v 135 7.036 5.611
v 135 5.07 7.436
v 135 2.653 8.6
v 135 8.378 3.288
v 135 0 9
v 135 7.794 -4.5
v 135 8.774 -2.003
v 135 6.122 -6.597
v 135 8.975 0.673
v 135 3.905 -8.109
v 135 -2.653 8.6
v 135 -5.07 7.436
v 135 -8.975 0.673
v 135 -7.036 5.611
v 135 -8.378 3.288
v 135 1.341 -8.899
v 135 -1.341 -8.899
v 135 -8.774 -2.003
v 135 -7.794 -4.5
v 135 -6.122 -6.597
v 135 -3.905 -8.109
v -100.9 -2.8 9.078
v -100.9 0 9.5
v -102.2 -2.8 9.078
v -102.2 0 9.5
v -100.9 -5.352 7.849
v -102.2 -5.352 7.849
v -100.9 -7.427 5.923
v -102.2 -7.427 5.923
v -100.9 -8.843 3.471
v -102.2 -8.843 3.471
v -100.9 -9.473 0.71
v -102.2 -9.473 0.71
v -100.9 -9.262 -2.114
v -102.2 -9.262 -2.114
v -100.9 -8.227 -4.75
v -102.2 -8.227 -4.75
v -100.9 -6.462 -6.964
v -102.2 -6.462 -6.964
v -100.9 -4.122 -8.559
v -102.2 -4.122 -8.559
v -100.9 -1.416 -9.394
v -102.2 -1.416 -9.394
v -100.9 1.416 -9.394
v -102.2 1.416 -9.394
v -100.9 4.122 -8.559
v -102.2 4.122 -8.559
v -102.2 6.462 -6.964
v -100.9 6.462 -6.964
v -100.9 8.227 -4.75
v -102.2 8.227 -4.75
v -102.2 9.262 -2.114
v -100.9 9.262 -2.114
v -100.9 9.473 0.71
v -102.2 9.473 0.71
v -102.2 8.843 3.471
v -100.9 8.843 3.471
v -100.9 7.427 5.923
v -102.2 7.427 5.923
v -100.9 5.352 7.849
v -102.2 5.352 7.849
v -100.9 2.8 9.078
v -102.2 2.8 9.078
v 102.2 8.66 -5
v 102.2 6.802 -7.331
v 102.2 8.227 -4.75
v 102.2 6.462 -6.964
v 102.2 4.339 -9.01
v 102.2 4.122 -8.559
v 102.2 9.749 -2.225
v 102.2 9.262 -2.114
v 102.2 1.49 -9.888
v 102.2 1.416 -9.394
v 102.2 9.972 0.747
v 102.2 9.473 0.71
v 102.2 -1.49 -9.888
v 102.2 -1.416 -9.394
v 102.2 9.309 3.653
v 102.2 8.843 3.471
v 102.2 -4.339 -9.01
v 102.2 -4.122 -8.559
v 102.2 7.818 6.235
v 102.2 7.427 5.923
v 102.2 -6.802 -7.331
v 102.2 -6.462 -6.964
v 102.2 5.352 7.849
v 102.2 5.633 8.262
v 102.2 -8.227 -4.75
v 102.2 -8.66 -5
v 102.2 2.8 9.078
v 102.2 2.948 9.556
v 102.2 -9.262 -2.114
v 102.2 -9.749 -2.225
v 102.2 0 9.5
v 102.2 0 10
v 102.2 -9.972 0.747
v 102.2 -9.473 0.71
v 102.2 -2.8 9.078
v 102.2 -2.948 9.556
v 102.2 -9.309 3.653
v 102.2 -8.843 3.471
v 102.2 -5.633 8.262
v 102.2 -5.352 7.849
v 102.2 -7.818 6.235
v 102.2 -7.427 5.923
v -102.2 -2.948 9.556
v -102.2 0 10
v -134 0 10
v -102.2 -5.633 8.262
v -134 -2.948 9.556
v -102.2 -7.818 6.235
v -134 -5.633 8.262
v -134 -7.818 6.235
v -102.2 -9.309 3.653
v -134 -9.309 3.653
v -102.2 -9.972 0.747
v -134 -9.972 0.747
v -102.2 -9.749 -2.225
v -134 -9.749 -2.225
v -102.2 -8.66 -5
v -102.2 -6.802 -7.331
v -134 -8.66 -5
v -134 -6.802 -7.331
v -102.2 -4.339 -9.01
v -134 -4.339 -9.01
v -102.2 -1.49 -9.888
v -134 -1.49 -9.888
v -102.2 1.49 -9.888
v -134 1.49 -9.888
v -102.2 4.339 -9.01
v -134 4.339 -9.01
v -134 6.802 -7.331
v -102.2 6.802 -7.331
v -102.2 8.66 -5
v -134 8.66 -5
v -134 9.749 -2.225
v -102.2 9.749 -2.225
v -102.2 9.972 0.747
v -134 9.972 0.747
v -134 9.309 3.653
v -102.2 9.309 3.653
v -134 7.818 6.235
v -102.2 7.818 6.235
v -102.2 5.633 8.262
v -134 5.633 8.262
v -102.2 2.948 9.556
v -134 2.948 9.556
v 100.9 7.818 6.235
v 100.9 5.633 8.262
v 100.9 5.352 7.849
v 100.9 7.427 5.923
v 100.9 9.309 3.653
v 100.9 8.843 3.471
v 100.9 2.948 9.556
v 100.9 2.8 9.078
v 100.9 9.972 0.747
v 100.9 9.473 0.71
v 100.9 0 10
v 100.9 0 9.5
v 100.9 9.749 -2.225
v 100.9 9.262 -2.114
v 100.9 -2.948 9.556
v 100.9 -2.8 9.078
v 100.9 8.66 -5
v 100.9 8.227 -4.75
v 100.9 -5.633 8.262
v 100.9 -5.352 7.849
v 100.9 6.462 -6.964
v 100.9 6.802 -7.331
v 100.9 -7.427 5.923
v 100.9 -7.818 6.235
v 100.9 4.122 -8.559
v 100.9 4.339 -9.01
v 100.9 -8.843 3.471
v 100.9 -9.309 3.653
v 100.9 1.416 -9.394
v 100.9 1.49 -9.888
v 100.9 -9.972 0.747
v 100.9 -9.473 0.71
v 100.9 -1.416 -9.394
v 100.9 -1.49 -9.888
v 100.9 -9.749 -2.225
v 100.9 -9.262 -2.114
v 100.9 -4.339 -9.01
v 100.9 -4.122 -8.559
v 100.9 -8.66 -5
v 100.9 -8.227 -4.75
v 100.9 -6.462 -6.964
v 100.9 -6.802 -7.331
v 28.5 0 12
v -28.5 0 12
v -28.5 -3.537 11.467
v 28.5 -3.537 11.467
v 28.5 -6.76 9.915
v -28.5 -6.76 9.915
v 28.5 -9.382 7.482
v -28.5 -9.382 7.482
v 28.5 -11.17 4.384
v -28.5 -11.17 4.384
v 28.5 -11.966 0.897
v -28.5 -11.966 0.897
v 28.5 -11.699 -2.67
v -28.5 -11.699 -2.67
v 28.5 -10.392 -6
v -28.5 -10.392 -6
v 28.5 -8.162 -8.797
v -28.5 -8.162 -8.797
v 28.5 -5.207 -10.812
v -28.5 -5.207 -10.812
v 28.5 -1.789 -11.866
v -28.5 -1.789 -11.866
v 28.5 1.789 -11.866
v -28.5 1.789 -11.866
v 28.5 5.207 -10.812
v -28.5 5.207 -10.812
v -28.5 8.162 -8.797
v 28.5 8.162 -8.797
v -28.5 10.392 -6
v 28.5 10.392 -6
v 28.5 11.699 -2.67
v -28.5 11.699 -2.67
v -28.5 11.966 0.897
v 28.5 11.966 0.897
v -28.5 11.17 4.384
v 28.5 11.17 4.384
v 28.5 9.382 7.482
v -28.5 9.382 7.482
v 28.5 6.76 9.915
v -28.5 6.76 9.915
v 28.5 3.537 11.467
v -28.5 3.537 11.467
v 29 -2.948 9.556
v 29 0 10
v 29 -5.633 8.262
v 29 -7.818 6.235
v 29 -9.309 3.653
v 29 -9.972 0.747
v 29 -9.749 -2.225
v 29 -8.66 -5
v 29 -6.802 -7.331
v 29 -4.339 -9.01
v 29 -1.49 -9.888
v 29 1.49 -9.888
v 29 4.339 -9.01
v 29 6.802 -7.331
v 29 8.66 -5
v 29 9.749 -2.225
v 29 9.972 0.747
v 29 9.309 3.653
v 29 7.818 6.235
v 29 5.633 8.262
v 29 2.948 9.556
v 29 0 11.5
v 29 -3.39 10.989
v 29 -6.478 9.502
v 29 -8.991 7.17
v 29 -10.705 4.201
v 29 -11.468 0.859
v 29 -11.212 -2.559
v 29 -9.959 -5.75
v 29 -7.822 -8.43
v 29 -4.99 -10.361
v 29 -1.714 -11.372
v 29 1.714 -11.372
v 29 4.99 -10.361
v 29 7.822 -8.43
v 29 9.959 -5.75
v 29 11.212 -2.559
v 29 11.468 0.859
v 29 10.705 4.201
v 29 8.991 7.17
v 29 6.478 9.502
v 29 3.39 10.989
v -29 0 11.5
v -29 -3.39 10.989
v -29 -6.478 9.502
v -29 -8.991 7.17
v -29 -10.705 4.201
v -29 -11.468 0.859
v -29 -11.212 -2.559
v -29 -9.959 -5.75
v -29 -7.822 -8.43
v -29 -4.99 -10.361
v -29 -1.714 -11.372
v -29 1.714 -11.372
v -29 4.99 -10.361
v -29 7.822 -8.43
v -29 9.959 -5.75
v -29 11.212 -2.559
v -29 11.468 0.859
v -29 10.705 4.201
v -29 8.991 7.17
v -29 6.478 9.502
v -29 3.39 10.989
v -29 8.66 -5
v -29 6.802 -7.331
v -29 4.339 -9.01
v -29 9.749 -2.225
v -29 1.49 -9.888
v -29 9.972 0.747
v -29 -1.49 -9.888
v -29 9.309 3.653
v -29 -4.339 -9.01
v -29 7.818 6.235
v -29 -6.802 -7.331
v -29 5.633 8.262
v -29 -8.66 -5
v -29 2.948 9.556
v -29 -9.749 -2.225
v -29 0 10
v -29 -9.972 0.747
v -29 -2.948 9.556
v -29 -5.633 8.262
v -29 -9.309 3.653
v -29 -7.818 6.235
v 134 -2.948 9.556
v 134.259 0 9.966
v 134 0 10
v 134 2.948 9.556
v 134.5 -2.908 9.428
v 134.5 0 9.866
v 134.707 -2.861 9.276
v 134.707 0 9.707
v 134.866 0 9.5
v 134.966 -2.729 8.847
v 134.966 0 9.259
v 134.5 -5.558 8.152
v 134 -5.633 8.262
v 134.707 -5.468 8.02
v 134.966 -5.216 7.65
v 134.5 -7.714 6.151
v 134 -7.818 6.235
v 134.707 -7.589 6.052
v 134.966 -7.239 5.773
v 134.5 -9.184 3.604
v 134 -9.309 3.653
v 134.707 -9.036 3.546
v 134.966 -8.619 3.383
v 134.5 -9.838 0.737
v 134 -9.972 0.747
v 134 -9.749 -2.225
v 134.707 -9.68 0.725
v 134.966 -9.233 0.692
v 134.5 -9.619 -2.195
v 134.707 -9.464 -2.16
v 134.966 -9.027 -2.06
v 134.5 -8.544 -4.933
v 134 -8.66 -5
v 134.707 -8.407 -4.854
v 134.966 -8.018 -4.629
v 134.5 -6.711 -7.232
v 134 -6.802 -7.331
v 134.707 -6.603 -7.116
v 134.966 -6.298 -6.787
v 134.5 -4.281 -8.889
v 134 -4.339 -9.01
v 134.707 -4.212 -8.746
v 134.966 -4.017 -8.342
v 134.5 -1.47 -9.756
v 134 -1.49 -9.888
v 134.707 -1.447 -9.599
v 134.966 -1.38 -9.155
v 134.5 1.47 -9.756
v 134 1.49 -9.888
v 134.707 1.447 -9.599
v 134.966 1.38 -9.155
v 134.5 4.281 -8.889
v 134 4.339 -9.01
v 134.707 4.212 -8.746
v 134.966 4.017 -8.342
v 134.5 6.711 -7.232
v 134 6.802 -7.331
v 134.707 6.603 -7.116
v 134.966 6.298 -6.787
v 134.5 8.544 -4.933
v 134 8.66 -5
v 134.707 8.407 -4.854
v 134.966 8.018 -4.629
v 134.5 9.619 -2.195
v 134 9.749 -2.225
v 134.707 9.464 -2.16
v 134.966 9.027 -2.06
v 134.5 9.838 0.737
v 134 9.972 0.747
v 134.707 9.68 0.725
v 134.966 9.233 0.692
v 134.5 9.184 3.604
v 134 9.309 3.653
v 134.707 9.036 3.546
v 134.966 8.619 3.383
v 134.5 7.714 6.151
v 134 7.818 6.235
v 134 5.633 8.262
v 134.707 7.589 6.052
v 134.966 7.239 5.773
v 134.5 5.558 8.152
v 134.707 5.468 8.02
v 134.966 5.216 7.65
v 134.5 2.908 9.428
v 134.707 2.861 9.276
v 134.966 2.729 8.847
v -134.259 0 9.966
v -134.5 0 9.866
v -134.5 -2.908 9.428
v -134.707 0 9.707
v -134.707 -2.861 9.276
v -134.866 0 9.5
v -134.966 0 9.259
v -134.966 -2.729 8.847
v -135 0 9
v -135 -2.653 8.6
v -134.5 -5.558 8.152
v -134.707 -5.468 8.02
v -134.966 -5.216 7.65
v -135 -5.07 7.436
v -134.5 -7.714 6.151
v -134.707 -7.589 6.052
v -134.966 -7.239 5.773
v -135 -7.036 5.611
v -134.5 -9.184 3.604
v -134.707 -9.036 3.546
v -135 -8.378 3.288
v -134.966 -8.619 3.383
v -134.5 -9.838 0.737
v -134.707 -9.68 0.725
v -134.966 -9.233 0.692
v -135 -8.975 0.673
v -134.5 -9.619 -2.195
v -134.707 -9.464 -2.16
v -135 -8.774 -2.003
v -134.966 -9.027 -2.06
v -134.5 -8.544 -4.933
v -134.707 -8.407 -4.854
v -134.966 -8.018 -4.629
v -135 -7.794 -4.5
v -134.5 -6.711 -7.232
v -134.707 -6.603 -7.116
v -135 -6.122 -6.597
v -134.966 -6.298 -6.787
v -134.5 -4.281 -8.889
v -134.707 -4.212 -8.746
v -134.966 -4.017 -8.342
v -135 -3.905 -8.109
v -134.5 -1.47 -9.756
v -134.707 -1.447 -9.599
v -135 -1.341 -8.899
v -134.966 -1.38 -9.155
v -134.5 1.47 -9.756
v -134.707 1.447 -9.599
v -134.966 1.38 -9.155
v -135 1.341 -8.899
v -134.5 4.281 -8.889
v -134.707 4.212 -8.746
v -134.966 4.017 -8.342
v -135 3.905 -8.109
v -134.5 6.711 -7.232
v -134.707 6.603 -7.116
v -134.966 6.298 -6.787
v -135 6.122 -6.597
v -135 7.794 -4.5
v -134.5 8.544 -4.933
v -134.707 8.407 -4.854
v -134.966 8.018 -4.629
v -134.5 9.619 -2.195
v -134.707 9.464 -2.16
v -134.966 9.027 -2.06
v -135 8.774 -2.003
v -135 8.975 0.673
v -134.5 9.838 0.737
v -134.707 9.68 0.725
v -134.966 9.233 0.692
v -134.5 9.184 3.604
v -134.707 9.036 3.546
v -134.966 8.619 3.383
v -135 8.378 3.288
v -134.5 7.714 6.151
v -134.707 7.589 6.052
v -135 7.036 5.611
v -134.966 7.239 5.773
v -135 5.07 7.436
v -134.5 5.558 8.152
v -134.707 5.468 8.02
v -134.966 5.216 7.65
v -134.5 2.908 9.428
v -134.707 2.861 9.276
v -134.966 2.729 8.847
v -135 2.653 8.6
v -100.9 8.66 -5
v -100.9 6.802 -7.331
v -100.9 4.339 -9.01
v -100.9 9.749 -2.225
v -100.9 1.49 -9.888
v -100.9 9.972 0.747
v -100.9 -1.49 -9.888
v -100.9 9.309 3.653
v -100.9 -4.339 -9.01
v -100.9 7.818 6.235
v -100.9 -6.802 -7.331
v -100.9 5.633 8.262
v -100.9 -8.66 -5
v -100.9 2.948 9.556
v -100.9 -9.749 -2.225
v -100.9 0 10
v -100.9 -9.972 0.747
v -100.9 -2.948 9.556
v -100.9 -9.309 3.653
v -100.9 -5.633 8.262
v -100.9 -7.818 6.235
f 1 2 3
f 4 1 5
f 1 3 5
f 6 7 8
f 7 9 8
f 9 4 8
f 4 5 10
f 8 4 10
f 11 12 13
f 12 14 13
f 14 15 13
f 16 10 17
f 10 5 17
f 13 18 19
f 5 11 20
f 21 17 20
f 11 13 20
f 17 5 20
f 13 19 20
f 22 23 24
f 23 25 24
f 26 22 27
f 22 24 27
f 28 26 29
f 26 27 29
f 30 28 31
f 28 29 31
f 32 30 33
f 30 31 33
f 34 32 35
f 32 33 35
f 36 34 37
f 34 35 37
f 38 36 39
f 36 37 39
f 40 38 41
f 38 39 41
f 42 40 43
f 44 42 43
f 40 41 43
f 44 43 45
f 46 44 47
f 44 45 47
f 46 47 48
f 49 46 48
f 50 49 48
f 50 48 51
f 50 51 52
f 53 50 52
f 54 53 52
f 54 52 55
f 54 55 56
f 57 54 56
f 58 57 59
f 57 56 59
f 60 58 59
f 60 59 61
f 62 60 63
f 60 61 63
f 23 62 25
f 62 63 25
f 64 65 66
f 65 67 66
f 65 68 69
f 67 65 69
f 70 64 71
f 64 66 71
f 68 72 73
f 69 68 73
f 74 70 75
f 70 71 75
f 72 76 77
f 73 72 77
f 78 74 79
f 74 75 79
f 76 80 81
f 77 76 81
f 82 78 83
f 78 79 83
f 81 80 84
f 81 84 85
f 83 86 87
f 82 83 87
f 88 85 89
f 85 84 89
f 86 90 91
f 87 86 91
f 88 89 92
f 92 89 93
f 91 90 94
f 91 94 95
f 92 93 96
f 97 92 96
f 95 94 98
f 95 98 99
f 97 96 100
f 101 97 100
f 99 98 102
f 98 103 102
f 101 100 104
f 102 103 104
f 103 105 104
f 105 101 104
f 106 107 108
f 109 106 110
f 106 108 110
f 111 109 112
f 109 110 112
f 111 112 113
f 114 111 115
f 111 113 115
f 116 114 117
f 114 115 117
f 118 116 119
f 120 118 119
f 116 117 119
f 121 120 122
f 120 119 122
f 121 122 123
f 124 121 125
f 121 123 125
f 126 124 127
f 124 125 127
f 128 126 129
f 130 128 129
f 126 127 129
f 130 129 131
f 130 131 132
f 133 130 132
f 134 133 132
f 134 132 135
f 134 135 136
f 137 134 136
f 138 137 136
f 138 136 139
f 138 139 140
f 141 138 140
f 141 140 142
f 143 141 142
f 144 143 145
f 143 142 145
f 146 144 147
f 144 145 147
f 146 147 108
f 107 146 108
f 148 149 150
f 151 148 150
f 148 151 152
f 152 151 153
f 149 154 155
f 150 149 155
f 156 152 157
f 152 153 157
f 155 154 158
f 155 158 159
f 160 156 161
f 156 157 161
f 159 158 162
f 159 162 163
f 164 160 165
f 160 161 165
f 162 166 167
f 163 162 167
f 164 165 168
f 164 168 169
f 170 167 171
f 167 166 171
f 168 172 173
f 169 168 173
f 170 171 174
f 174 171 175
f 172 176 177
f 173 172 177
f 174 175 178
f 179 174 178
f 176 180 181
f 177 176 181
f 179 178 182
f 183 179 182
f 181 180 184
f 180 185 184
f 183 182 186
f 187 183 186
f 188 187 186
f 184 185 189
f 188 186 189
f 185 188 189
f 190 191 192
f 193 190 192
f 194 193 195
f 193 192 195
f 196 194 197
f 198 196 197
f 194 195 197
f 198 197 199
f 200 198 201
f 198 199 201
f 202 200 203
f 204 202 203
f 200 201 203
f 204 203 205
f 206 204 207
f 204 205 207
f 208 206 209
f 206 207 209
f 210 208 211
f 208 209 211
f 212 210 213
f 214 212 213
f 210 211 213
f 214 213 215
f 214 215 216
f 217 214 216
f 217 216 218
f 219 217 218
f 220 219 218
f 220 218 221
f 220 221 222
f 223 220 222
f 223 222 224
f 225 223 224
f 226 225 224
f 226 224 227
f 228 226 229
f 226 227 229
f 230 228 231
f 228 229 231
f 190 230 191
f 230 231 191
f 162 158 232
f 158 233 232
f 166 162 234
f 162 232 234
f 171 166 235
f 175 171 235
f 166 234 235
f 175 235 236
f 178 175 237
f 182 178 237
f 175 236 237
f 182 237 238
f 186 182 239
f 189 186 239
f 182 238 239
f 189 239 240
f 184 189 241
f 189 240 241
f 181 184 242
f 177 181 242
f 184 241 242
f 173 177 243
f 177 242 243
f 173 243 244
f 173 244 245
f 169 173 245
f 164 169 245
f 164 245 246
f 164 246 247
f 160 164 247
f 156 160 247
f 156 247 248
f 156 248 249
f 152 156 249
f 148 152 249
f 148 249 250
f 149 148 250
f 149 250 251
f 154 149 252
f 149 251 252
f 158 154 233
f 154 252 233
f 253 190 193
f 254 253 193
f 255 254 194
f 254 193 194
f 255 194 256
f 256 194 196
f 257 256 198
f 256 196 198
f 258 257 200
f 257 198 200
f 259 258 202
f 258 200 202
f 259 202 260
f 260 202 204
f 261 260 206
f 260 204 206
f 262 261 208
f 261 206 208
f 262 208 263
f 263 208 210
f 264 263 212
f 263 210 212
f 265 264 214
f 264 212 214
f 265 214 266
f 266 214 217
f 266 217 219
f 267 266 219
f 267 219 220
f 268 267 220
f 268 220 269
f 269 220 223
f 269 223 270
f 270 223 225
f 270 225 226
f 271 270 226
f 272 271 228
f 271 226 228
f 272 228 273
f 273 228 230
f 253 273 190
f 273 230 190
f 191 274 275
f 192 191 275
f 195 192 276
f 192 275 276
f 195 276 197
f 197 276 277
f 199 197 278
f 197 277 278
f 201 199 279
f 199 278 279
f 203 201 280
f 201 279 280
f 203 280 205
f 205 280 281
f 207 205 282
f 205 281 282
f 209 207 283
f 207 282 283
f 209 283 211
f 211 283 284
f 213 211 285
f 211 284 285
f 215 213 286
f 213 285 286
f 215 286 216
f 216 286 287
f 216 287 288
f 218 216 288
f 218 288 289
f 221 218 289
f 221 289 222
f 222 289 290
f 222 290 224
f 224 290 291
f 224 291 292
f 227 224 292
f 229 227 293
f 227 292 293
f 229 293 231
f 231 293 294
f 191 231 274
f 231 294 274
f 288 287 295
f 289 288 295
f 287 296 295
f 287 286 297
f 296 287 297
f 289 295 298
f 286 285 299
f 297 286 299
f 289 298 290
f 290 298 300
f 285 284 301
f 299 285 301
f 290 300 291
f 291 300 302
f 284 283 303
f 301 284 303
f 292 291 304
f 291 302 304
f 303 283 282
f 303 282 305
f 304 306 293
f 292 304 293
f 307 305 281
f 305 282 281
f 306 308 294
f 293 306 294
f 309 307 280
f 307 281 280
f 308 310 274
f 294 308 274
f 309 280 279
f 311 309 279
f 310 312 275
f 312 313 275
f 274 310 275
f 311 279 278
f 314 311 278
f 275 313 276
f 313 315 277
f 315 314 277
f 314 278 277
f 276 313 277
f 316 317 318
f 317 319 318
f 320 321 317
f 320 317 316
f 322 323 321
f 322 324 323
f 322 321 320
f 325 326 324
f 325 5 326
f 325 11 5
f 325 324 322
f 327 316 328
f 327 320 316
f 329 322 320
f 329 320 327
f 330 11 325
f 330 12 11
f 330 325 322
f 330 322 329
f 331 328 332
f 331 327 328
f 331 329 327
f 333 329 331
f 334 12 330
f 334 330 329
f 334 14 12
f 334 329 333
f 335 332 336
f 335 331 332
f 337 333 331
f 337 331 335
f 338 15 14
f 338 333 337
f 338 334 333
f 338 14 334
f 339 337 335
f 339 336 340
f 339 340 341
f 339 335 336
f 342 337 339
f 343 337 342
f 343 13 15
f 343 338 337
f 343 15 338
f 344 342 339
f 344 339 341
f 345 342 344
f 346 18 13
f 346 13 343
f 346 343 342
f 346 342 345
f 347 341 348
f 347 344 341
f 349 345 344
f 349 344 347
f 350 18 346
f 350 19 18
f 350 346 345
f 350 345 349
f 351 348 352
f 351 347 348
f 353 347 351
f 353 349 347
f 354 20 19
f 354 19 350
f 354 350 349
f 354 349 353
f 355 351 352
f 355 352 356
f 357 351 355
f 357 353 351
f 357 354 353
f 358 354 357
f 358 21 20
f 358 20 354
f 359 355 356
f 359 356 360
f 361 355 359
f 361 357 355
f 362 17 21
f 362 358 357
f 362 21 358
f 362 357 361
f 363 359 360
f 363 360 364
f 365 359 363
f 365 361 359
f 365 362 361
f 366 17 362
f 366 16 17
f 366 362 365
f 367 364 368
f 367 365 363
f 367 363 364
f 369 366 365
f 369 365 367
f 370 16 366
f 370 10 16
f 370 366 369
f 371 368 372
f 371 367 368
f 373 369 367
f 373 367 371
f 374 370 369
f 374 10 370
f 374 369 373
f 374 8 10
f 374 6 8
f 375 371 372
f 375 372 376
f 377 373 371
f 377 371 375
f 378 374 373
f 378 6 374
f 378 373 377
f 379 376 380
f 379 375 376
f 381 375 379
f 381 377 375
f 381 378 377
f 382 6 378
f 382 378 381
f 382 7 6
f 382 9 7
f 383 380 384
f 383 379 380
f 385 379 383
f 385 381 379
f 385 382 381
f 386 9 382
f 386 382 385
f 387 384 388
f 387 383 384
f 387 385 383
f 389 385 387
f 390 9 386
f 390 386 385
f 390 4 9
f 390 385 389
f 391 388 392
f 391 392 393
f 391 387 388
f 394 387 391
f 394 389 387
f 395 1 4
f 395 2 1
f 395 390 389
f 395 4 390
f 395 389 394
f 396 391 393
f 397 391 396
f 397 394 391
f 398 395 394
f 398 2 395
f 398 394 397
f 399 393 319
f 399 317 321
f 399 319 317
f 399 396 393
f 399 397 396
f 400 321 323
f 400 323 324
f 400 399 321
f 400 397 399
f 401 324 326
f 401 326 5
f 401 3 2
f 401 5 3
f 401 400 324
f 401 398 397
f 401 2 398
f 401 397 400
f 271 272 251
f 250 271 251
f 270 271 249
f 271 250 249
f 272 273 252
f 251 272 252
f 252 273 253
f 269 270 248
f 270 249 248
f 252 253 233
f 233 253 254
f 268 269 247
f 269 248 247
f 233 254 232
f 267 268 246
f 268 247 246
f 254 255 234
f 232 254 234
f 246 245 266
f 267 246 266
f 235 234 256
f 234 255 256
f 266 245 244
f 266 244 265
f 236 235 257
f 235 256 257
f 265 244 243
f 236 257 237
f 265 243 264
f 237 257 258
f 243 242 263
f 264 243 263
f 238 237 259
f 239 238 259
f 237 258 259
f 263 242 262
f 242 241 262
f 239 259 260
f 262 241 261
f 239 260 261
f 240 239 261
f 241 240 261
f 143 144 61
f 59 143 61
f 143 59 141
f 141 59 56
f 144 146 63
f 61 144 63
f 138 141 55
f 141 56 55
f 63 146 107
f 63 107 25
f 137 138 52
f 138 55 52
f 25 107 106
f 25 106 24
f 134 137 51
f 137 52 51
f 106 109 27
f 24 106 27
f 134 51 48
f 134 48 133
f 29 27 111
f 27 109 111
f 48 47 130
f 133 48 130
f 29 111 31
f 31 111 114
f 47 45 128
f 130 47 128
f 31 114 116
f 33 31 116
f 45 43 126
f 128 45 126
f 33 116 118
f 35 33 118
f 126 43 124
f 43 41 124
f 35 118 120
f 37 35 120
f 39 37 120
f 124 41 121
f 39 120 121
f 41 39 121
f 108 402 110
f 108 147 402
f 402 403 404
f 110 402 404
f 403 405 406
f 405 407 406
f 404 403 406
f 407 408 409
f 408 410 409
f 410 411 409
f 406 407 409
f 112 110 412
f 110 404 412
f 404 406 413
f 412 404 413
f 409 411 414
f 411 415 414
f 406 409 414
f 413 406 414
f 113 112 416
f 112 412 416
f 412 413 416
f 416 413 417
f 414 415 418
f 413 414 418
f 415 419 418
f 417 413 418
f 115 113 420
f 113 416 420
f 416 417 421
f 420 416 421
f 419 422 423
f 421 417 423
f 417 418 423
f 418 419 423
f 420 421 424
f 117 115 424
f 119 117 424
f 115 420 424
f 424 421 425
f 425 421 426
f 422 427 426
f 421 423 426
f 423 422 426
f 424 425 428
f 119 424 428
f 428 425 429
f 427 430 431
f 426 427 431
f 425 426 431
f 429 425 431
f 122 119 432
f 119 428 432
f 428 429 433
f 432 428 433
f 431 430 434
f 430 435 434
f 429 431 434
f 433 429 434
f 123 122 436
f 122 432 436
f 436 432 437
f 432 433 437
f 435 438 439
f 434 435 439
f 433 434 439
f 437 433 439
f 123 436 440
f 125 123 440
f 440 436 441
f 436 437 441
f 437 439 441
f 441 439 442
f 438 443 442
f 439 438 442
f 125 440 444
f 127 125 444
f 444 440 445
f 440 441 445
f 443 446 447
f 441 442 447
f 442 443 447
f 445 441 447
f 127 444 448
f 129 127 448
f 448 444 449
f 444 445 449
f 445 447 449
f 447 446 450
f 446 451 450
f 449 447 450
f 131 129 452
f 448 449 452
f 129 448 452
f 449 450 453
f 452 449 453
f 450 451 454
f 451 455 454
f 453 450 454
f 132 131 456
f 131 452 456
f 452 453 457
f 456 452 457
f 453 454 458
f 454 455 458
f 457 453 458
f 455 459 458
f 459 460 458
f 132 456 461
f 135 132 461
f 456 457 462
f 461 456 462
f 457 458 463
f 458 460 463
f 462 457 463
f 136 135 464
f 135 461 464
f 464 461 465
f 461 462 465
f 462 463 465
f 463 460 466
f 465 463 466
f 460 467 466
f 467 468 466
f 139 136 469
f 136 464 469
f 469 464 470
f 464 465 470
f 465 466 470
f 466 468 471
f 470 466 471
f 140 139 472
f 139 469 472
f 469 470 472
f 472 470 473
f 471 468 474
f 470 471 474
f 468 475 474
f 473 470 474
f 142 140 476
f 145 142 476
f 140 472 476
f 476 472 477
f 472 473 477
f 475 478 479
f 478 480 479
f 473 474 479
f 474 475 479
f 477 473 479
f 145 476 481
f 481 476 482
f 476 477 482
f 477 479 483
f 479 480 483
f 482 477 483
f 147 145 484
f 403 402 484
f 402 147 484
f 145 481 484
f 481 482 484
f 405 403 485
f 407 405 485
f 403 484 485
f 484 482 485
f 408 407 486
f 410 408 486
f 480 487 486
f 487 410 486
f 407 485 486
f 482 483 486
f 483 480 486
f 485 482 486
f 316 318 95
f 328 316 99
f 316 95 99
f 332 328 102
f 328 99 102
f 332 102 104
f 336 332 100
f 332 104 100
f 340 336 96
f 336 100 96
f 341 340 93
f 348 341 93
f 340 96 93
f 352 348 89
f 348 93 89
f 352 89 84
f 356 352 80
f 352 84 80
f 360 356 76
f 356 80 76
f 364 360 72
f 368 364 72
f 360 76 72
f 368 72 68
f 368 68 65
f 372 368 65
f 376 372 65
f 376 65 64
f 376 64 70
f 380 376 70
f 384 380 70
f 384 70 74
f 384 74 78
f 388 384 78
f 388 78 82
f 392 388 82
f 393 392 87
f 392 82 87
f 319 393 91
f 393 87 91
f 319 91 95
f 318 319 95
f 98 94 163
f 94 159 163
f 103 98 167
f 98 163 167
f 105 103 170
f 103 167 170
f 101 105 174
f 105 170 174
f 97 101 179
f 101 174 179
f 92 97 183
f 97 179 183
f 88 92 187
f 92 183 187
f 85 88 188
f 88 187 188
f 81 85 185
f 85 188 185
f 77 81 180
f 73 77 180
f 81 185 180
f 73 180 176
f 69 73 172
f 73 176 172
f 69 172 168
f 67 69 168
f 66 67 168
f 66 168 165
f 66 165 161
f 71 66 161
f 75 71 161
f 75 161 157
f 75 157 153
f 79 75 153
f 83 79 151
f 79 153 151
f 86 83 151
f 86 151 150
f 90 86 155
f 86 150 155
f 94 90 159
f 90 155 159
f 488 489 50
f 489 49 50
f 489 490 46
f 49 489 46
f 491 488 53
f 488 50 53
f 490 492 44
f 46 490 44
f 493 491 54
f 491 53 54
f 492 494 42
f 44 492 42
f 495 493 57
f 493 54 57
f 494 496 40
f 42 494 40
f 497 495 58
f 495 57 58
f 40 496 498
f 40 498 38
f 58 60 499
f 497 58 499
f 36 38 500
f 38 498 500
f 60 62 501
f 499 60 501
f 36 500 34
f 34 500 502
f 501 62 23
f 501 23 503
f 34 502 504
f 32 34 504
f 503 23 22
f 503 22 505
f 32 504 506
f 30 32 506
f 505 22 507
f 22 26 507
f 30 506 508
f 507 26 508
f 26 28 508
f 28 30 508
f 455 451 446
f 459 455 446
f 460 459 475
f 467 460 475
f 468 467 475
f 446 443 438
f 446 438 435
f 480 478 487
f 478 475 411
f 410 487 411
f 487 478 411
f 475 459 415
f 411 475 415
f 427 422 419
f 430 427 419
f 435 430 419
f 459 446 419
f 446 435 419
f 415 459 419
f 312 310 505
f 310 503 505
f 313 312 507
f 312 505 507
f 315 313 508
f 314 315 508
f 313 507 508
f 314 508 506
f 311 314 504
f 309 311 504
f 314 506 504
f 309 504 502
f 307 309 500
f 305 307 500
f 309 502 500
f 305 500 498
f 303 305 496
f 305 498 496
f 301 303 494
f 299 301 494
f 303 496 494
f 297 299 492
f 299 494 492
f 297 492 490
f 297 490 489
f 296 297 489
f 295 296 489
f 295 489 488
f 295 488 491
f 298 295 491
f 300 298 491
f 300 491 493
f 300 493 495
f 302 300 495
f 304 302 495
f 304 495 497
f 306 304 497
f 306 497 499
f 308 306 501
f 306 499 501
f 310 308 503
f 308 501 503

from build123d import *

# Parameters (mm, degrees)
CHAMFER1_SIZE = 0.5
FILLET1_R     = 1


with BuildPart() as part:
    # Sketch1 → Revolve1 (revolve)
    with BuildSketch(Plane(origin=(0, 0, 0), x_dir=(1, 0, 0), z_dir=(0, 1, 0)), mode=Mode.PRIVATE) as revolve1_sk:
        Polygon((-135, 10), (-135, 0), (135, 0), (135, 8), (135, 10), (102.2, 10), (102.2, 9.5), (100.9, 9.5), (100.9, 10), (29, 10), (29, 12), (-29, 12), (-29, 10), (-100.9, 10), (-100.9, 9.5), (-102.2, 9.5), (-102.2, 10), align=None)
    revolve(revolve1_sk.sketch.rotate(Axis((-135, 0, 0), (1, 0, 0)), 180), axis=Axis((-135, 0, 0), (1, 0, 0)))

    # Chamfer1
    chamfer1_edges = [part.edges().sort_by_distance(p)[0] for p in [
        (-29, 0, -12),
        (29, 0, -12),
    ]]
    chamfer(chamfer1_edges, length=CHAMFER1_SIZE)

    # Fillet1
    fillet1_edges = [part.edges().sort_by_distance(p)[0] for p in [
        (-135, 0, -10),
        (135, 0, -10),
    ]]
    fillet(fillet1_edges, radius=FILLET1_R)


solid = part.part
